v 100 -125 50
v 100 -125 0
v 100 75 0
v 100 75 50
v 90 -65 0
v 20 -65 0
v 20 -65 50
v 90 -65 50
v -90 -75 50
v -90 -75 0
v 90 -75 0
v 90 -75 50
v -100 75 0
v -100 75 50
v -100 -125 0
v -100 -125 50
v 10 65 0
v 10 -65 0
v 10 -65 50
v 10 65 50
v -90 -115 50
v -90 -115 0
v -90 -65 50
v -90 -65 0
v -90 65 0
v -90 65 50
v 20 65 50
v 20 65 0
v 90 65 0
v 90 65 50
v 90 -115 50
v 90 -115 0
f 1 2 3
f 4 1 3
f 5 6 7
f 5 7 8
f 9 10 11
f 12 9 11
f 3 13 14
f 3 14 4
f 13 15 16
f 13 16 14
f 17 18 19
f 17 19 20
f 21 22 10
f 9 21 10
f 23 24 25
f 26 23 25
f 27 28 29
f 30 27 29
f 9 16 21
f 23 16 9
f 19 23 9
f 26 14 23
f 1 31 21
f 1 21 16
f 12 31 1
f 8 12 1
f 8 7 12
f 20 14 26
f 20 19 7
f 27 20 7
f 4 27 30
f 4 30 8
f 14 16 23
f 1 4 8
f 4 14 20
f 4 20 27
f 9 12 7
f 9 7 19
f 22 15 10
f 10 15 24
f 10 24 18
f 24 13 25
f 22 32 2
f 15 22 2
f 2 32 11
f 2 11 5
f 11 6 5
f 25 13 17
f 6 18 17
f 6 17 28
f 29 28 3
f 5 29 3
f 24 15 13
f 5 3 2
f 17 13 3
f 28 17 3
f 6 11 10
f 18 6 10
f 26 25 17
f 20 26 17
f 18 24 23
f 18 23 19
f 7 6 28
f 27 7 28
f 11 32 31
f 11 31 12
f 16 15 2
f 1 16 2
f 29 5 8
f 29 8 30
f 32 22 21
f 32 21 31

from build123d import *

# Parameters (mm, degrees)
SKETCH1_W           = 10
SKETCH1_H           = 40
SKETCH1_H_2         = 10
SKETCH1_W_2         = 180
SKETCH1_W_3         = 200
SKETCH1_H_3         = 150
SKETCH1_W_4         = 100
SKETCH1_H_4         = 130
SKETCH1_W_5         = 70
BOSS_EXTRUDE1_DEPTH = 50


with BuildPart() as part:
    # Sketch1 → Boss-Extrude1 (new body)
    # profile 1 of 6: a face of its own
    with BuildSketch(Plane.XY):
        with Locations((-95, -95)):
            Rectangle(SKETCH1_W, SKETCH1_H)
    # profile 2 of 6: a face of its own
    with BuildSketch(Plane.XY):
        with Locations((-95, -120)):
            Rectangle(SKETCH1_W, SKETCH1_H_2)
    # profile 3 of 6: a face of its own
    with BuildSketch(Plane.XY):
        with Locations((0, -120)):
            Rectangle(SKETCH1_W_2, SKETCH1_H_2)
    # profile 4 of 6: a face of its own
    with BuildSketch(Plane.XY):
        with Locations((95, -120)):
            Rectangle(SKETCH1_W, SKETCH1_H_2)
    # profile 5 of 6: a face of its own
    with BuildSketch(Plane.XY):
        with Locations((95, -95)):
            Rectangle(SKETCH1_W, SKETCH1_H)
    # profile 6 of 6: a face of its own
    with BuildSketch(Plane.XY):
        Rectangle(SKETCH1_W_3, SKETCH1_H_3)
        with Locations((-40, 0)):
            Rectangle(SKETCH1_W_4, SKETCH1_H_4, mode=Mode.SUBTRACT)
        with Locations((55, 0)):
            Rectangle(SKETCH1_W_5, SKETCH1_H_4, mode=Mode.SUBTRACT)
    extrude(amount=BOSS_EXTRUDE1_DEPTH)


solid = part.part
